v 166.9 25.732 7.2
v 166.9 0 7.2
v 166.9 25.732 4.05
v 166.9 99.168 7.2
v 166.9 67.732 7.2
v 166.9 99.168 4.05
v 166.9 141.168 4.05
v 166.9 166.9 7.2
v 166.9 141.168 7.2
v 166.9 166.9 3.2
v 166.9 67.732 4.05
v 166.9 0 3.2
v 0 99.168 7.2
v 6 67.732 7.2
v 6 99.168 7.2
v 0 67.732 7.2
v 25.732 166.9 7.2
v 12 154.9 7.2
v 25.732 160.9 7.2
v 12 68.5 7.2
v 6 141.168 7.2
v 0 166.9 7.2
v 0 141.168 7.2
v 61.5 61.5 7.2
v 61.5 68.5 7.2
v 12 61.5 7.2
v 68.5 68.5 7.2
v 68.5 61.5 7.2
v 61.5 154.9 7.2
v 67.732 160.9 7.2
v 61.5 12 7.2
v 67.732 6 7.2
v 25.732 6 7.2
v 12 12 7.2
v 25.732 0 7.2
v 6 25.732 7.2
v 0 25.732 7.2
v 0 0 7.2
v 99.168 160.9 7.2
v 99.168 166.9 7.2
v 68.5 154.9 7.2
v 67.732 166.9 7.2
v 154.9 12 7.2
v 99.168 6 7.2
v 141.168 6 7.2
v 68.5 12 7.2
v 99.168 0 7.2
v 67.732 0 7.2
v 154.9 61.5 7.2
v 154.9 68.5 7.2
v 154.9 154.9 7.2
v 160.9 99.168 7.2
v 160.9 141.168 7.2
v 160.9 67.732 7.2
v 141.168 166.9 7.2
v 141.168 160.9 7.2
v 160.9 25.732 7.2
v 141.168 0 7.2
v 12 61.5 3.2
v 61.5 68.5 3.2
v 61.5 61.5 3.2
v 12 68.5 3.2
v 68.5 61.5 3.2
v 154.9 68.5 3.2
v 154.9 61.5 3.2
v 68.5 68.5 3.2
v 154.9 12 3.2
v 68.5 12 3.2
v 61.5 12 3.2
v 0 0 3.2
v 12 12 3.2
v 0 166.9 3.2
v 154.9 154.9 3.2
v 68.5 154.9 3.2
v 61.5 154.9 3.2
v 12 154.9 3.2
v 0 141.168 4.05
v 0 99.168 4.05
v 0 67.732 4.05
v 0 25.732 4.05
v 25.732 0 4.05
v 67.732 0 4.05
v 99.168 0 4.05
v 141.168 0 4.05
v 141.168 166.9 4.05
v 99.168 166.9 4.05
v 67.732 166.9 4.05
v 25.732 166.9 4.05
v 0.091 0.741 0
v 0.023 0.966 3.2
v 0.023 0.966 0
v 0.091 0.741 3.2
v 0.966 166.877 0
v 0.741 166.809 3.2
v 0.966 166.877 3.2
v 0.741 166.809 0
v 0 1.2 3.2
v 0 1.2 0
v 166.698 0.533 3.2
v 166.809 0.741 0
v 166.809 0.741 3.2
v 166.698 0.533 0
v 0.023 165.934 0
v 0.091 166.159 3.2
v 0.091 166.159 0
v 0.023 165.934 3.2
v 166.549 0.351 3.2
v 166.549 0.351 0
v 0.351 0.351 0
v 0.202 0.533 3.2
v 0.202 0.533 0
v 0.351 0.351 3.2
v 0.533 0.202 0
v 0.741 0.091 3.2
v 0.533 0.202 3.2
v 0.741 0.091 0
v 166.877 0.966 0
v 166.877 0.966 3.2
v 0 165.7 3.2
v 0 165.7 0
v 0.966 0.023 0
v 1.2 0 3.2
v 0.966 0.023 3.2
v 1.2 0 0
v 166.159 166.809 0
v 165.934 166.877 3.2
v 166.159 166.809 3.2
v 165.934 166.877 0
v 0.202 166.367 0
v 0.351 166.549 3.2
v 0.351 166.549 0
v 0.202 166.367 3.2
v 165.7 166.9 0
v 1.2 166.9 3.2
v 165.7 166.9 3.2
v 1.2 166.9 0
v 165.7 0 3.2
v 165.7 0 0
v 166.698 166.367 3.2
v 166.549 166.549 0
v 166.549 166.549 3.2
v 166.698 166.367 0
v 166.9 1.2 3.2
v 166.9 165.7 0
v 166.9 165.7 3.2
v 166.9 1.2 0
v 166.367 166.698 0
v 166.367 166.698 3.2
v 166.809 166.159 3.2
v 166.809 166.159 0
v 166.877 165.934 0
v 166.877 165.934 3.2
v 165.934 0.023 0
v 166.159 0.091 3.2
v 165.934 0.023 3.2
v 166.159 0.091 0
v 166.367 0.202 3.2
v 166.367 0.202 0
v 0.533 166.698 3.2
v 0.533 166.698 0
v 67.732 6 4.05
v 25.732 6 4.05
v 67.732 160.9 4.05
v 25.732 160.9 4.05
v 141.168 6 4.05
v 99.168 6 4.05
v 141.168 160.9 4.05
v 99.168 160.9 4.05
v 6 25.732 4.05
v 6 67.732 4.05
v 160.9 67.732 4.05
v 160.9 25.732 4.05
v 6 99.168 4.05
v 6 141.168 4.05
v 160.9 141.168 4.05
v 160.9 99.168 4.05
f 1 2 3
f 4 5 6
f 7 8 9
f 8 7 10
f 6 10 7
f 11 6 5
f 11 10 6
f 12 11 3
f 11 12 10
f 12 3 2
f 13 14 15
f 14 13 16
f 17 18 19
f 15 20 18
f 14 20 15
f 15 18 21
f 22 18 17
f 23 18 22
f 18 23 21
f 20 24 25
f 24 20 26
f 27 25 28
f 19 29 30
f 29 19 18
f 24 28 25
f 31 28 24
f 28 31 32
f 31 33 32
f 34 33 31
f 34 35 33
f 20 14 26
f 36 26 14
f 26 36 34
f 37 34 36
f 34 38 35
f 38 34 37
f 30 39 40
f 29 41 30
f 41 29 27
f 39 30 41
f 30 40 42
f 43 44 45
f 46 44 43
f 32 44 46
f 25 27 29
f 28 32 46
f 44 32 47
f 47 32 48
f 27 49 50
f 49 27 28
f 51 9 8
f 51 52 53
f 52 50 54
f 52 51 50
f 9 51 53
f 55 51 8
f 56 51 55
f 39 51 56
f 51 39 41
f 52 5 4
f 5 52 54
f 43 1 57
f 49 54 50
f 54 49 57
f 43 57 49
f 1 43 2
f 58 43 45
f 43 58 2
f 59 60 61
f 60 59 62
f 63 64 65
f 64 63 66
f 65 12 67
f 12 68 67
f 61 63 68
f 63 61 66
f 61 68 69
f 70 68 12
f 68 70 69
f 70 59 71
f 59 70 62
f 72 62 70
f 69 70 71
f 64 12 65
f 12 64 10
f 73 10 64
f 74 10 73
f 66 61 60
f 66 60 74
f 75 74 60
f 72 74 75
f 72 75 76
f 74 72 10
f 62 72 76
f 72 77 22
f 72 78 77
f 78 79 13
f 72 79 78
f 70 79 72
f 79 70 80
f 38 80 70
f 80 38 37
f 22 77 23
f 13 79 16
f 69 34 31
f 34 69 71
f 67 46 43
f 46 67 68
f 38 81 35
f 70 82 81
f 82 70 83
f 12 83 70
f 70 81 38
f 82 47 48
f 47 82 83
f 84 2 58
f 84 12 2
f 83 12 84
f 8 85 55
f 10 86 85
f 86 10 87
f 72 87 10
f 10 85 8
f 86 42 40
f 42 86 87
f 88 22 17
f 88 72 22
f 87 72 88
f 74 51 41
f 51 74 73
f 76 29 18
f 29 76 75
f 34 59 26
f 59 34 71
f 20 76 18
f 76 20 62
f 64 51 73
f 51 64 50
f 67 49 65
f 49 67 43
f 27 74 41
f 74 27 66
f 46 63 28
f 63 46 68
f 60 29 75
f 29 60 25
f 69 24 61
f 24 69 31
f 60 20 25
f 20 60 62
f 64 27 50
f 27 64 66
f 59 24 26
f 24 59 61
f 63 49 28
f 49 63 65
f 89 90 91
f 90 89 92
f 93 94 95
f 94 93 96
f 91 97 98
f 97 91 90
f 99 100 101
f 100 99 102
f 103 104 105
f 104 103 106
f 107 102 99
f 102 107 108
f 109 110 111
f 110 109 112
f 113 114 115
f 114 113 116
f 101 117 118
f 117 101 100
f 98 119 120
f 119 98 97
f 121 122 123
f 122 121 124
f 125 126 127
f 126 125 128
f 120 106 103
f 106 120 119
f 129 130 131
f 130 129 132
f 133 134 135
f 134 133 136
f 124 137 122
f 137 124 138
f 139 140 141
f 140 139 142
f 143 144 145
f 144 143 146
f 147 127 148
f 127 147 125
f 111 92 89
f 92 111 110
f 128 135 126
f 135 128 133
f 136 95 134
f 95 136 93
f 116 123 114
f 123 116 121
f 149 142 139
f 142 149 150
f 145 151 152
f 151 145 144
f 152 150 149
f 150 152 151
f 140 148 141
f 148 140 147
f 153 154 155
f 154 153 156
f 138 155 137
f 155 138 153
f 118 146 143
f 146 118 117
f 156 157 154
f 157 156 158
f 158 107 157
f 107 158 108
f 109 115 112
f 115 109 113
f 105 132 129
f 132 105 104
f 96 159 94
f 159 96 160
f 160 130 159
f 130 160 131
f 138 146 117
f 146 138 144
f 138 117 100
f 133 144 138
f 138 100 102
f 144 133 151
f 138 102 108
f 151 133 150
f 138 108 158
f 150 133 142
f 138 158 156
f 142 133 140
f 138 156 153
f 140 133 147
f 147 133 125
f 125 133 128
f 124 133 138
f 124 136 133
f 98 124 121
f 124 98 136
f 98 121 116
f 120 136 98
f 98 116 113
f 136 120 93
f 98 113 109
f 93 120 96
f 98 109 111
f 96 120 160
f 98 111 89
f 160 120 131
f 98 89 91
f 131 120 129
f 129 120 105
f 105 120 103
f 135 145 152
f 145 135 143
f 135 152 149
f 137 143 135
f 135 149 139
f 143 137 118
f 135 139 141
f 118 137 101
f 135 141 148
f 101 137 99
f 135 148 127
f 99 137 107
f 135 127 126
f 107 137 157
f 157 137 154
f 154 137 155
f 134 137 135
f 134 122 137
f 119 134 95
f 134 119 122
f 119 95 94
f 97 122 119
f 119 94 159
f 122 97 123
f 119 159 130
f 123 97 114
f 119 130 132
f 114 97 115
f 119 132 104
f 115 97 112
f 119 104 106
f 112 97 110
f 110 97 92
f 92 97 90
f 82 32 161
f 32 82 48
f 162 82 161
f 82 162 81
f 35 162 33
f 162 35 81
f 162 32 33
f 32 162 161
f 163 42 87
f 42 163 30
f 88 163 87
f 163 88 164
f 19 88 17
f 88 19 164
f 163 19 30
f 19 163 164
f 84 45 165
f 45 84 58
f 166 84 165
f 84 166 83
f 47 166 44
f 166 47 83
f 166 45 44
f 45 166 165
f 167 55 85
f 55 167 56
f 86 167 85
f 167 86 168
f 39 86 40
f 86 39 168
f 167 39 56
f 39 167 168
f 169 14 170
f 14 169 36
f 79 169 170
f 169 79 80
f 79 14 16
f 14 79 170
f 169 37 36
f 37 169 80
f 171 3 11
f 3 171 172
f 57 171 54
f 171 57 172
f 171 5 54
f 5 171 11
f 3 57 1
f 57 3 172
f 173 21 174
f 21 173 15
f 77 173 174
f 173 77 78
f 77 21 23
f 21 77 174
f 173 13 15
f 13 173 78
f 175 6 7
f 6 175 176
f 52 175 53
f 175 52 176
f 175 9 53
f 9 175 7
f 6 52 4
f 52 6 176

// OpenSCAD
/*
Wall inner liner tile.
Print orientation: large interior face on the bed, ribs and key recesses upward.
Quantity: use across all wall inner positions.
*/

use <../planter_support_free.scad>

export_wall_inner_tile();
